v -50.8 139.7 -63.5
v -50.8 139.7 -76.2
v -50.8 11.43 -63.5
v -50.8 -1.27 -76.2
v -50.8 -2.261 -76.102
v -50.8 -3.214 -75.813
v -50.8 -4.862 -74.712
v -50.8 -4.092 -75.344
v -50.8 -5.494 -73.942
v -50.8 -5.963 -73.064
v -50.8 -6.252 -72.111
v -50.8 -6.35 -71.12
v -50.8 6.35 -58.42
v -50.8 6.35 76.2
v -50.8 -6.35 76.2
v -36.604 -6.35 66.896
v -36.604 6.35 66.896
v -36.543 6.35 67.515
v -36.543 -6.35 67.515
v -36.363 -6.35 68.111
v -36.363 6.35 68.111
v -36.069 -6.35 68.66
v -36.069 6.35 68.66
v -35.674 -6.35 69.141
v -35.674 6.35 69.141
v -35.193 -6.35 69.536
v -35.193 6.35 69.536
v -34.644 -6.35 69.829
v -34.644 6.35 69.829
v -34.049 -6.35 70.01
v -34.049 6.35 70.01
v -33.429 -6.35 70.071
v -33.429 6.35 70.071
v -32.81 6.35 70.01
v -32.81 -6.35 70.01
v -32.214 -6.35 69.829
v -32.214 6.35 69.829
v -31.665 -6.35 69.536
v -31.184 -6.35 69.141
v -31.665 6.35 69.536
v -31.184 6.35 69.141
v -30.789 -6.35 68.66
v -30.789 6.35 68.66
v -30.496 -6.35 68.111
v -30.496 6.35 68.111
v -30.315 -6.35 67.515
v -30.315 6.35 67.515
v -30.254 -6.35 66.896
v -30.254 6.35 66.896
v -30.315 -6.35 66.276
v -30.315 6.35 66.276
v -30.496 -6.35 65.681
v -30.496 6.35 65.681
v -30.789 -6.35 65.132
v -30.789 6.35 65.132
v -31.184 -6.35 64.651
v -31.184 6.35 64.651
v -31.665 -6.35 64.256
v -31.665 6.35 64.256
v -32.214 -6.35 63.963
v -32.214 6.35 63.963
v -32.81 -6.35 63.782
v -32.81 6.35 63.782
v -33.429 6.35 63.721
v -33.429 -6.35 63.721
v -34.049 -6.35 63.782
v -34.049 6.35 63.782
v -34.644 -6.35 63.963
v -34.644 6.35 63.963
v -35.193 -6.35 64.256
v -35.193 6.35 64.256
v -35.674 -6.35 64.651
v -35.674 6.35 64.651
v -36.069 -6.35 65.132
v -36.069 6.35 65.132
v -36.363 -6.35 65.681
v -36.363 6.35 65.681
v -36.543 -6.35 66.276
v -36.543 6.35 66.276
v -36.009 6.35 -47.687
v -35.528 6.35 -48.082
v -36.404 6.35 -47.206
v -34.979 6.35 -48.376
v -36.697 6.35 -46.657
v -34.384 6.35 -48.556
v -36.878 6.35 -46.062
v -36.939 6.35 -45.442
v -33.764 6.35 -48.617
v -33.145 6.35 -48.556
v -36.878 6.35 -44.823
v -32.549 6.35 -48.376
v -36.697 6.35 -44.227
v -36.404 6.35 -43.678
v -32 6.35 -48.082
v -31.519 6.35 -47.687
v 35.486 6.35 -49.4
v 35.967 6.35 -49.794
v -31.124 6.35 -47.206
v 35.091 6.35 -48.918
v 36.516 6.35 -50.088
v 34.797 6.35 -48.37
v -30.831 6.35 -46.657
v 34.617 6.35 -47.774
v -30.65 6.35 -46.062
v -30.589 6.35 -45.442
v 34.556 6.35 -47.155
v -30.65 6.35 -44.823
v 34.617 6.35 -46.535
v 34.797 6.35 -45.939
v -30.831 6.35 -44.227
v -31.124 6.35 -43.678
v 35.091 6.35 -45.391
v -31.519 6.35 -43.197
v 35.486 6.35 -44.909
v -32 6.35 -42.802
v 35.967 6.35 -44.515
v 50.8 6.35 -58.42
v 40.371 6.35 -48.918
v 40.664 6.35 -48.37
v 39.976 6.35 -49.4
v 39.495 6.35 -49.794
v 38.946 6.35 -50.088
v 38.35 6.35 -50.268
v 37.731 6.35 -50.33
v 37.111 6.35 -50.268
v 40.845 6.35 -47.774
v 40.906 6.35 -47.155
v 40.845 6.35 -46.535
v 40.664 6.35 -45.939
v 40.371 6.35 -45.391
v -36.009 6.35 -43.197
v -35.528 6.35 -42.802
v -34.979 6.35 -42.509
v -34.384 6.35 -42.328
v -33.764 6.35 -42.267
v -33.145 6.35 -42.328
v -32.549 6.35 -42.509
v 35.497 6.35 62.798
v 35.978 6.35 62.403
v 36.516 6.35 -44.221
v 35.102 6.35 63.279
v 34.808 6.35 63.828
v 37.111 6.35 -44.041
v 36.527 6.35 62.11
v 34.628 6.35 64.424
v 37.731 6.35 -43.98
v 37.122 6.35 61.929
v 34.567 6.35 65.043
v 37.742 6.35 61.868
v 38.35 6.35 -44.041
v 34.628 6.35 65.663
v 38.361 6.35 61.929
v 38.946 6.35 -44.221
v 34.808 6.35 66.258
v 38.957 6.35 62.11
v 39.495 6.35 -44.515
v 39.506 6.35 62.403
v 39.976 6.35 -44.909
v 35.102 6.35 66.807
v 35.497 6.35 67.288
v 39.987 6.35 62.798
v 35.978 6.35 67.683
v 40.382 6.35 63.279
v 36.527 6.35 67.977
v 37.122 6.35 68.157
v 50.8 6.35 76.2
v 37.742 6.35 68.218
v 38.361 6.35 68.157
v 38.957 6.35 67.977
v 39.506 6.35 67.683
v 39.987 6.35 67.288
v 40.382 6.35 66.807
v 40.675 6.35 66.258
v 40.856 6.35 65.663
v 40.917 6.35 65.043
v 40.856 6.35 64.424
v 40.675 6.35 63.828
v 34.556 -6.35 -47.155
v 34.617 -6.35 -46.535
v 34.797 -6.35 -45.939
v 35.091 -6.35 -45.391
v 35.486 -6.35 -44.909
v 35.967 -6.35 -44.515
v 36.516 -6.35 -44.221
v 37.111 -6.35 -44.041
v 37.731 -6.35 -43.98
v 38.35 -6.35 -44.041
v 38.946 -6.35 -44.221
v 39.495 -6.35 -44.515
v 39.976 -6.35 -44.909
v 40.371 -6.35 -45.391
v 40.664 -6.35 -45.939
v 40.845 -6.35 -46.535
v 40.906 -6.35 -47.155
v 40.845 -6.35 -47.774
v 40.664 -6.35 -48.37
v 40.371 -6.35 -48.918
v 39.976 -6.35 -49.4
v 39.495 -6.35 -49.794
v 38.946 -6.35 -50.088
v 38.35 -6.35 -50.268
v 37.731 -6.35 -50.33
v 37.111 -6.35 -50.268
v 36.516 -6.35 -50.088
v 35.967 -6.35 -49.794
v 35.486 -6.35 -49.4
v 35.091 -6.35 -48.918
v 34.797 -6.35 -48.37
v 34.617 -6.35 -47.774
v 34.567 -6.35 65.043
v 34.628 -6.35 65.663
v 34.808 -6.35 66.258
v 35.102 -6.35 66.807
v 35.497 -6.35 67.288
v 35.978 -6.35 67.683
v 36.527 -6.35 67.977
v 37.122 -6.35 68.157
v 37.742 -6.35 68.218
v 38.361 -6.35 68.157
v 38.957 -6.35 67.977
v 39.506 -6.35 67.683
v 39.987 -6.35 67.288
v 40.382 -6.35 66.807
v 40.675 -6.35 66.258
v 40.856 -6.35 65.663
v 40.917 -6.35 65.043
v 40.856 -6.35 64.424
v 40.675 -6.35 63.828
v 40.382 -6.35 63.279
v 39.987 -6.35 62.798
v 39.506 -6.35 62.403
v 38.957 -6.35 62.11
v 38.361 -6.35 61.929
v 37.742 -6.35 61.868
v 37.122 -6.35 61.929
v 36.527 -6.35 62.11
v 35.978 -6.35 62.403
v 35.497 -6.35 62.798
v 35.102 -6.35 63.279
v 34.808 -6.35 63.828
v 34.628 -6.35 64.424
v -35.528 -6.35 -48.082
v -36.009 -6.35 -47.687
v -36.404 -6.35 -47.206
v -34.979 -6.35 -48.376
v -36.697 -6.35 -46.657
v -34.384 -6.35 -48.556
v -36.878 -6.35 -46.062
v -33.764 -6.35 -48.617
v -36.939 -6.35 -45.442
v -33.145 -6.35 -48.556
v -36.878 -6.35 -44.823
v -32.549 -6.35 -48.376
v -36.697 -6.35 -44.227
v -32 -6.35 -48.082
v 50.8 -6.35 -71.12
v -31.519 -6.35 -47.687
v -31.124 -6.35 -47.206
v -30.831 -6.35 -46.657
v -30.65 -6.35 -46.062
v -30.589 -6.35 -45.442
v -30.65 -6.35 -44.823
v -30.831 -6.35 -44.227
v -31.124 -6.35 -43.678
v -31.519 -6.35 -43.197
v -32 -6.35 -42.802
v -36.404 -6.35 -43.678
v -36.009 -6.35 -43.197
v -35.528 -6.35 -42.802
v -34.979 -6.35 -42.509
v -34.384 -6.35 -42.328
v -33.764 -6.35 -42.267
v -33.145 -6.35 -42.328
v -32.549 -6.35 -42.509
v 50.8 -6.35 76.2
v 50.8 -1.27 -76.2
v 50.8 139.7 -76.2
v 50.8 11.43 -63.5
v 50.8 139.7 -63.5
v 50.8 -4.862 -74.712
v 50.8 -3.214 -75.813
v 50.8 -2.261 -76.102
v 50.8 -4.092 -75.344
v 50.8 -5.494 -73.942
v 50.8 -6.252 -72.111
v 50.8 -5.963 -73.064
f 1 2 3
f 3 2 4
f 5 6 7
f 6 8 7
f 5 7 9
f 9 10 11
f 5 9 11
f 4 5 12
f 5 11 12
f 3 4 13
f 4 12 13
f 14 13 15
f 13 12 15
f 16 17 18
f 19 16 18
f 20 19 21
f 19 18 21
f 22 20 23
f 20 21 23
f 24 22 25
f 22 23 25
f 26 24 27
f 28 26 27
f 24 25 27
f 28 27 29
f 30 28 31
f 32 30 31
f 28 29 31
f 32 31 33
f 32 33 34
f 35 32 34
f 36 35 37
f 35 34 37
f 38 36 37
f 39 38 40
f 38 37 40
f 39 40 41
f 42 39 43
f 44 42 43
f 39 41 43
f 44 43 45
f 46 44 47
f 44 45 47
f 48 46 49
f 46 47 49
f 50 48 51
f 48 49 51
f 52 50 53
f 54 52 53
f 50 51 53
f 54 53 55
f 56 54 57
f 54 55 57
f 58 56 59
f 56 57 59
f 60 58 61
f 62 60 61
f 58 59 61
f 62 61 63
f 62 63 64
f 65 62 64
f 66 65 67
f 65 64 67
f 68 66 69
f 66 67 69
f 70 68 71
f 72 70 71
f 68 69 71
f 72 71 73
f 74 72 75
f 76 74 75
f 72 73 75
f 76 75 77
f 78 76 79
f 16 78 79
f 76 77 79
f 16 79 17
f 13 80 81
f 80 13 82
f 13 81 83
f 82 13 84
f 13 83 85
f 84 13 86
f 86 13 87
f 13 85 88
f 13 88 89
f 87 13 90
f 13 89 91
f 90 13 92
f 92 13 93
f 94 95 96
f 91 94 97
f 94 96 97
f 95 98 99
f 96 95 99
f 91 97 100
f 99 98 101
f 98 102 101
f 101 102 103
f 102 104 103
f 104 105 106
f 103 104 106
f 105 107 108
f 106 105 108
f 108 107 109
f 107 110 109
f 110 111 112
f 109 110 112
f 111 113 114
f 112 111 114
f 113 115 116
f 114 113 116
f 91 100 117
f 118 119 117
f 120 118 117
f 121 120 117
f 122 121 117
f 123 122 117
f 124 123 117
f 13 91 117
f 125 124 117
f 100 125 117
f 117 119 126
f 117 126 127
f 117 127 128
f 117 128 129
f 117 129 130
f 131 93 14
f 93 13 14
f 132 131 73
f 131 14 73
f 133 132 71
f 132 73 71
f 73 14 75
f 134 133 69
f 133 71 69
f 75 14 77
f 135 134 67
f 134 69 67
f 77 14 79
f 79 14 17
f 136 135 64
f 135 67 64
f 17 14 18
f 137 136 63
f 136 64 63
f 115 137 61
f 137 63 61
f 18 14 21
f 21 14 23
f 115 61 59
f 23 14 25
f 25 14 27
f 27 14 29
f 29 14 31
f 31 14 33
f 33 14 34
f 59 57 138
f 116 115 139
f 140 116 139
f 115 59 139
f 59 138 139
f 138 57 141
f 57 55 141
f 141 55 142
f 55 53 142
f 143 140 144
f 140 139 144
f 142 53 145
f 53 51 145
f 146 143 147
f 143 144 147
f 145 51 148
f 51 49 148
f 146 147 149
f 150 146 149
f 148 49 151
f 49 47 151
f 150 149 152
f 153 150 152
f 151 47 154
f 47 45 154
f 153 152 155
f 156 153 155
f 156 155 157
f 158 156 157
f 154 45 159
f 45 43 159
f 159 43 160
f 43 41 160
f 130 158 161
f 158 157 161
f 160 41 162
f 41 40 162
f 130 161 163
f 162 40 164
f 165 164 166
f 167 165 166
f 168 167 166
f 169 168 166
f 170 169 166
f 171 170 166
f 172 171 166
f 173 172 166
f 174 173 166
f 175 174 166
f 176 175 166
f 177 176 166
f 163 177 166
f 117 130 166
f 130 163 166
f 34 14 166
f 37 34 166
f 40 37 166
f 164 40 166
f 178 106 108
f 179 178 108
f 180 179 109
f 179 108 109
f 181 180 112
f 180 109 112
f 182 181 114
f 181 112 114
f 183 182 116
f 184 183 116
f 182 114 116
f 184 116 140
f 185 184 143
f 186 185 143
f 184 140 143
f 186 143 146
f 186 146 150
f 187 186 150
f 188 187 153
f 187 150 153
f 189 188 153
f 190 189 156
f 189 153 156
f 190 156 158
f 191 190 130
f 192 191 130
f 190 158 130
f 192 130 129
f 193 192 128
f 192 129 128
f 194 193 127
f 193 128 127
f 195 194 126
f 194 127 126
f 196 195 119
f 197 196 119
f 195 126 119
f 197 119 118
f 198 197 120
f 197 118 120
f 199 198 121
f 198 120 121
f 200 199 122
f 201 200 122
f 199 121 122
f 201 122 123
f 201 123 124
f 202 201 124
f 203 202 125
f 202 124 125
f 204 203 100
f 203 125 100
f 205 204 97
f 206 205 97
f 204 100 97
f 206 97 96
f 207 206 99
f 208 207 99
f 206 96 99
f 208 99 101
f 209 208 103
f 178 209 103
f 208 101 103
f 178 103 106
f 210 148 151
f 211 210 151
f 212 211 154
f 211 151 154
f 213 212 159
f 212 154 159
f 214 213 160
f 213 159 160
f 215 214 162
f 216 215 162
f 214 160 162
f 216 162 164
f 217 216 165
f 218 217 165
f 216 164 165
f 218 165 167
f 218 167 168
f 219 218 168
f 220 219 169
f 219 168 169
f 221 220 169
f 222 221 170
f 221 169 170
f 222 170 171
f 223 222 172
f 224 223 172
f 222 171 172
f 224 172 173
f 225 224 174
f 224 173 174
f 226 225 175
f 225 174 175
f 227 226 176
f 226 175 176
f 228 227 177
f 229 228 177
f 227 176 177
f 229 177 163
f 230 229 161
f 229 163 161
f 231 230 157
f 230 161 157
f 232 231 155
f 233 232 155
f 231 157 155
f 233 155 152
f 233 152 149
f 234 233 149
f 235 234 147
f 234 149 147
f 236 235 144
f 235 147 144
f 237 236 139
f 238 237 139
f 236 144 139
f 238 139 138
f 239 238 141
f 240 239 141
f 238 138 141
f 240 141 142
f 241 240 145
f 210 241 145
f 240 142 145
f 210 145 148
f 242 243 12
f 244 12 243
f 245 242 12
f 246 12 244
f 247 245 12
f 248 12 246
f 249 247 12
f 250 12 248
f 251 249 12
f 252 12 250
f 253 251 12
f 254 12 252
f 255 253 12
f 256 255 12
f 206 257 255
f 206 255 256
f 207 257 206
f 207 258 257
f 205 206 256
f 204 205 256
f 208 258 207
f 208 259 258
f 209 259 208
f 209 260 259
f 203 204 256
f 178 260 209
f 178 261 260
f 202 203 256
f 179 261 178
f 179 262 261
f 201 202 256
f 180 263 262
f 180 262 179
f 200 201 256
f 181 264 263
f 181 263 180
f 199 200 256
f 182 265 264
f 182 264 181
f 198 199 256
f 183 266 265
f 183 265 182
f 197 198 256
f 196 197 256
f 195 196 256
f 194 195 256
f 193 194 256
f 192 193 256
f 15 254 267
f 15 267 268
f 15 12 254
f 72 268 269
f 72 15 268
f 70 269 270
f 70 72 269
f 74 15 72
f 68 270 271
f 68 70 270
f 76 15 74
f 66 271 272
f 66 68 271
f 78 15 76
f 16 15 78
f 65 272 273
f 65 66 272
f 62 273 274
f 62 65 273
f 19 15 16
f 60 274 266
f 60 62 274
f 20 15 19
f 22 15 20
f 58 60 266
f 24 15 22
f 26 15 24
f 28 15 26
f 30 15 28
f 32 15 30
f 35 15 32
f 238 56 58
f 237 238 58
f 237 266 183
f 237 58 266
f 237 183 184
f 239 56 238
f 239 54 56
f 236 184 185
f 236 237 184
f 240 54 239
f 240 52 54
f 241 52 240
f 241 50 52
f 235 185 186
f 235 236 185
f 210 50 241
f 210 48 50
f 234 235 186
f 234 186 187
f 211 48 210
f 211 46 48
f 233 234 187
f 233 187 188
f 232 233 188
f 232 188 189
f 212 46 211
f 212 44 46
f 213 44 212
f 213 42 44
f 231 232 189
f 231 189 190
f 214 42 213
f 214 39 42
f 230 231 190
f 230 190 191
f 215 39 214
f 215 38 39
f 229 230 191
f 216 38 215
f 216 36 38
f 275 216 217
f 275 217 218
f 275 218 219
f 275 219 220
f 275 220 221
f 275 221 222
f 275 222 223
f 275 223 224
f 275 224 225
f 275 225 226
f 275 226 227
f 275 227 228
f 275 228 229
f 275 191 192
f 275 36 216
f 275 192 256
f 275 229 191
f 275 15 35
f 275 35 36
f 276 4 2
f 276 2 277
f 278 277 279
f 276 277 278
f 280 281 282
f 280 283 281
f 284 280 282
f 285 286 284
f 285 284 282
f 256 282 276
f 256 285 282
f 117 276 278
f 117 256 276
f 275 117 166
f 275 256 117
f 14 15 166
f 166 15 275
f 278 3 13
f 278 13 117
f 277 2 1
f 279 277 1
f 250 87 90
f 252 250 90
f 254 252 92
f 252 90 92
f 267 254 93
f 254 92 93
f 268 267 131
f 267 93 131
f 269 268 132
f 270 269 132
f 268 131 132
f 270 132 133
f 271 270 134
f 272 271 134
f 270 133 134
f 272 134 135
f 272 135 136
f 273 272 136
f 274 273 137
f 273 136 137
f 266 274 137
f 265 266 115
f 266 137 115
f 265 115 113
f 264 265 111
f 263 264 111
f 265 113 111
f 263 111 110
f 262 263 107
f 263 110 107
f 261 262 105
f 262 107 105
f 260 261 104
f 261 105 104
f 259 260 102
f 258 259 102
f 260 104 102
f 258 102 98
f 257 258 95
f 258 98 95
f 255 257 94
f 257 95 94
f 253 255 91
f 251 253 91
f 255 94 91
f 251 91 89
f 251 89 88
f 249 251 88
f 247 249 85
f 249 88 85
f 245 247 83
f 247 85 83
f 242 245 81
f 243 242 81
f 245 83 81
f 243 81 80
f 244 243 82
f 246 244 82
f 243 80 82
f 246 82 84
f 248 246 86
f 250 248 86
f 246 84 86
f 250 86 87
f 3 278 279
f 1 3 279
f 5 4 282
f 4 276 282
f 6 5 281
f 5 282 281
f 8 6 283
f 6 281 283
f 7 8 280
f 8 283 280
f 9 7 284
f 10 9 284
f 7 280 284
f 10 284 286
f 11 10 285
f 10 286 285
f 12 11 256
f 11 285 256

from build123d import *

# Parameters (mm, degrees)
F0_W     = 101.6
F0_H     = 152.4
F1_DEPTH = 6.35
F2_W     = 139.7
F2_H     = 76.2
F3_DEPTH = 50.8
F4_DEPTH = 63.5
F5_SIZE  = 5.08
F6_R     = 5.08
F7_R     = 3.175
F8_DEPTH = 12.7


with BuildPart() as f1:
    # F0 (on Front) → F1 (new body, symmetric)
    with BuildSketch(Plane.XZ):
        Rectangle(F0_W, F0_H)
    extrude(amount=F1_DEPTH, both=True)

    # F2 (on Right) → F3 (join, symmetric)
    with BuildSketch(Plane.YZ):
        with Locations((69.85, -38.1)):
            Rectangle(F2_W, F2_H)
    extrude(amount=F3_DEPTH, both=True)

    # F4 (cut): a face of the model
    f4_faces = [f1.faces().sort_by_distance(p)[0] for p in [
        (0, 73.025, 0),
    ]]
    extrude(f4_faces, amount=-F4_DEPTH, mode=Mode.SUBTRACT)

    # F5
    f5_edges = [f1.edges().sort_by_distance(p)[0] for p in [
        (0, 6.35, -63.5),
    ]]
    chamfer(f5_edges, length=F5_SIZE)

    # F6
    f6_edges = [f1.edges().sort_by_distance(p)[0] for p in [
        (0, -6.35, -76.2),
    ]]
    fillet(f6_edges, radius=F6_R)

    # F7 (on face) → F8 (cut)
    with BuildSketch(Plane(origin=(0, 6.35, 0), x_dir=(-1, 0, 0), z_dir=(0, 1, 0))):
        with Locations((-37.7415953271, 65.0431930406)):
            Circle(F7_R)
        with Locations((33.4293011874, 66.8958395785)):
            Circle(F7_R)
        with Locations((33.7640900696, -45.4423770942)):
            Circle(F7_R)
        with Locations((-37.7306027449, -47.1545040206)):
            Circle(F7_R)
    extrude(amount=-F8_DEPTH, mode=Mode.SUBTRACT)


solid = f1.part
